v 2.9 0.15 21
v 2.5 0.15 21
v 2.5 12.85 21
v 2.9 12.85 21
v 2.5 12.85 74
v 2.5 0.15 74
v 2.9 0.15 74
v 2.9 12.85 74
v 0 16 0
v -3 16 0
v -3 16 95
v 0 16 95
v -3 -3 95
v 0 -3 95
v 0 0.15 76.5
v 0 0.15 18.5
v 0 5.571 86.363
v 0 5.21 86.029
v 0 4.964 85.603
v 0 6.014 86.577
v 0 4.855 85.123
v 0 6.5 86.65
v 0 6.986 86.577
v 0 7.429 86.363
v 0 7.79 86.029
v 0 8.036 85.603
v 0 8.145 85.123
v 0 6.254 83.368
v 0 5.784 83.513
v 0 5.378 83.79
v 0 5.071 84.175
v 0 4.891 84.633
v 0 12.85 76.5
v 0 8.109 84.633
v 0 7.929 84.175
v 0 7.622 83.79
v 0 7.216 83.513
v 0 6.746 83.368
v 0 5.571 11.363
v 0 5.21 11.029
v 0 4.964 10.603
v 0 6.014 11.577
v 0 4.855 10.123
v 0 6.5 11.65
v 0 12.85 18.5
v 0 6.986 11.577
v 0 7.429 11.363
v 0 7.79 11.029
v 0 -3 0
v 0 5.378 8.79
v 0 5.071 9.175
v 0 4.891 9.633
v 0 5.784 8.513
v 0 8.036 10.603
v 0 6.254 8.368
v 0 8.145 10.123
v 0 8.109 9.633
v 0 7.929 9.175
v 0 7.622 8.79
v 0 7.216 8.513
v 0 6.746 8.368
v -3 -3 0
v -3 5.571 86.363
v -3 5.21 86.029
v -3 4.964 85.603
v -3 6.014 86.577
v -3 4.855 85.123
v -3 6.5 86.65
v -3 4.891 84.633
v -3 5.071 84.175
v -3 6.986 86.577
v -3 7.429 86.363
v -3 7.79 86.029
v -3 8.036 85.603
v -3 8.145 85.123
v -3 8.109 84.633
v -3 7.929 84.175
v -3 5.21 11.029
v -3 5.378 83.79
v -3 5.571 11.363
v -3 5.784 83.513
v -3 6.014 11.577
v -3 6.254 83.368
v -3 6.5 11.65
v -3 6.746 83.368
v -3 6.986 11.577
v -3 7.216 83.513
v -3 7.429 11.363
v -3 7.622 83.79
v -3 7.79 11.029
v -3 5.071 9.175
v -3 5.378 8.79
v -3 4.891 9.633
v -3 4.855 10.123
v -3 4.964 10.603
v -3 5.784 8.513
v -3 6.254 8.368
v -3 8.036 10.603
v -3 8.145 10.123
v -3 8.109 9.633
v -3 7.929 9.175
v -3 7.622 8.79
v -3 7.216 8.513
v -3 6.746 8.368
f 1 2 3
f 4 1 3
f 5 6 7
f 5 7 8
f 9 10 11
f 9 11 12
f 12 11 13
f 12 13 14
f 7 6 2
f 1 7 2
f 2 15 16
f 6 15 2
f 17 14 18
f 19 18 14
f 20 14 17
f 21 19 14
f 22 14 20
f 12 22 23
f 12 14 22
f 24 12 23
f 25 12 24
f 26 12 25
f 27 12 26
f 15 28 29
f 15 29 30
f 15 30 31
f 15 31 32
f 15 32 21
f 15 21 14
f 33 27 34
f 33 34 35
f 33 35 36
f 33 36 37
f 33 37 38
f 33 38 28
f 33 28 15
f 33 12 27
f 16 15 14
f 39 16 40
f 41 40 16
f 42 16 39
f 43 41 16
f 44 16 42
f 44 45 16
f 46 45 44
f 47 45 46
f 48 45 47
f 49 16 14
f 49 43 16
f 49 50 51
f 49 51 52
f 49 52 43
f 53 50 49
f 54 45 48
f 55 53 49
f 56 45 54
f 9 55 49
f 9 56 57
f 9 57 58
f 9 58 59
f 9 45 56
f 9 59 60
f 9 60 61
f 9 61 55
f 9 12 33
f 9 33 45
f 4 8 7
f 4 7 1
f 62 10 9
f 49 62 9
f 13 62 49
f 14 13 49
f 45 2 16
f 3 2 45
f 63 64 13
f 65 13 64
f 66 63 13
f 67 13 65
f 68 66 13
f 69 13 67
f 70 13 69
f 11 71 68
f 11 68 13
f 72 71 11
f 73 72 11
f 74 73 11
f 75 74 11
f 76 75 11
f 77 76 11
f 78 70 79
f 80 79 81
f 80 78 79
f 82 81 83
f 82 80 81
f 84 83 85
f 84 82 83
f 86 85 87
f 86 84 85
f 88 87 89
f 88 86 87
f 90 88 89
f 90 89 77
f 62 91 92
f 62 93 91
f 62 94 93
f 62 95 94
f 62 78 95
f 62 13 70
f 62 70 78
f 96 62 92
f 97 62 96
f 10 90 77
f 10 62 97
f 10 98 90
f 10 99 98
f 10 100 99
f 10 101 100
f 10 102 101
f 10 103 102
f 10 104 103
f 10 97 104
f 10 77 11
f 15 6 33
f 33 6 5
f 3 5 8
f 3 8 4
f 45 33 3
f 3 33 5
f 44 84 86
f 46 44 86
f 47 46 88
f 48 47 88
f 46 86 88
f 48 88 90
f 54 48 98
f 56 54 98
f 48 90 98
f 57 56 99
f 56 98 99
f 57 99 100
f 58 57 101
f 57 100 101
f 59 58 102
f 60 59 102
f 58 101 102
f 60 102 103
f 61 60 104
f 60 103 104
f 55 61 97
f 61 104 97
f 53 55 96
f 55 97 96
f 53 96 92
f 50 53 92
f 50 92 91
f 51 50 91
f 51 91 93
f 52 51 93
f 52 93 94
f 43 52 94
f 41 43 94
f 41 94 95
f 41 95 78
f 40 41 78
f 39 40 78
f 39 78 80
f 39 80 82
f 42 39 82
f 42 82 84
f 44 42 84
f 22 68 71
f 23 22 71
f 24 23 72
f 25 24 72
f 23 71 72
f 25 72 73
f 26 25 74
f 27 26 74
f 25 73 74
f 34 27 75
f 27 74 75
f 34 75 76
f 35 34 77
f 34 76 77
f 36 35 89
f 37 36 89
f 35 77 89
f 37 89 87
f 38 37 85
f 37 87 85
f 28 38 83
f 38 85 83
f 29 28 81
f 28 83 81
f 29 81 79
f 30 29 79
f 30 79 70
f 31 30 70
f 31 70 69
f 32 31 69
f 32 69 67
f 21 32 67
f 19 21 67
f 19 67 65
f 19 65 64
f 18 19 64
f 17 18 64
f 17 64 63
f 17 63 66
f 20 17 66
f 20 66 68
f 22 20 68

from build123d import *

# Parameters (mm, degrees)
SKETCH_1_W          = 19
SKETCH_1_H          = 19
SKETCH_1_W_2        = 13
SKETCH_1_H_2        = 13
EXTRUDE_1_DEPTH     = 95
SKETCH_2_R          = 1.65
CUT_EXTRUDE_1_DEPTH = 30
SKETCH_3_W          = 95
SKETCH_3_H          = 19
CUT_EXTRUDE_2_DEPTH = 16
SKETCH_4_W          = 53
SKETCH_4_H          = 12.7
EXTRUDE_1_2_DEPTH   = 2.9
CHAMFER_1_SIZE      = 2.5


with BuildPart() as part:
    # 草图1 → Extrude 1 (new body)
    with BuildSketch(Plane.XY):
        with Locations((6.5, 6.5)):
            Rectangle(SKETCH_1_W, SKETCH_1_H)
        with Locations((6.5, 6.5)):
            Rectangle(SKETCH_1_W_2, SKETCH_1_H_2, mode=Mode.SUBTRACT)
    extrude(amount=EXTRUDE_1_DEPTH)

    # 草图2 → 切除-拉伸1 (cut)
    with BuildSketch(Plane.ZY.offset(3)):
        with Locations((10, 6.5)):
            Circle(SKETCH_2_R)
        with Locations((85, 6.5)):
            Circle(SKETCH_2_R)
    extrude(amount=-CUT_EXTRUDE_1_DEPTH, mode=Mode.SUBTRACT)

    # 草图3 → 切除-拉伸2 (cut)
    with BuildSketch(Plane(origin=(16, 0, 0), x_dir=(0, 0, -1), z_dir=(1, 0, 0))):
        with Locations((-47.5, 6.5)):
            Rectangle(SKETCH_3_W, SKETCH_3_H)
    extrude(amount=-CUT_EXTRUDE_2_DEPTH, mode=Mode.SUBTRACT)

    # 草图4 → Extrude 1 2 (add)
    with BuildSketch(Plane(origin=(0, 0, 0), x_dir=(0, 0, -1), z_dir=(1, 0, 0))):
        with Locations((-47.5, 6.5)):
            Rectangle(SKETCH_4_W, SKETCH_4_H)
    extrude(amount=EXTRUDE_1_2_DEPTH)

    # 倒角1
    chamfer_1_edges = [part.edges().sort_by_distance(p)[0] for p in [
        (0, 6.5, 74),
        (0, 6.5, 21),
    ]]
    chamfer(chamfer_1_edges, length=CHAMFER_1_SIZE)


solid = part.part
